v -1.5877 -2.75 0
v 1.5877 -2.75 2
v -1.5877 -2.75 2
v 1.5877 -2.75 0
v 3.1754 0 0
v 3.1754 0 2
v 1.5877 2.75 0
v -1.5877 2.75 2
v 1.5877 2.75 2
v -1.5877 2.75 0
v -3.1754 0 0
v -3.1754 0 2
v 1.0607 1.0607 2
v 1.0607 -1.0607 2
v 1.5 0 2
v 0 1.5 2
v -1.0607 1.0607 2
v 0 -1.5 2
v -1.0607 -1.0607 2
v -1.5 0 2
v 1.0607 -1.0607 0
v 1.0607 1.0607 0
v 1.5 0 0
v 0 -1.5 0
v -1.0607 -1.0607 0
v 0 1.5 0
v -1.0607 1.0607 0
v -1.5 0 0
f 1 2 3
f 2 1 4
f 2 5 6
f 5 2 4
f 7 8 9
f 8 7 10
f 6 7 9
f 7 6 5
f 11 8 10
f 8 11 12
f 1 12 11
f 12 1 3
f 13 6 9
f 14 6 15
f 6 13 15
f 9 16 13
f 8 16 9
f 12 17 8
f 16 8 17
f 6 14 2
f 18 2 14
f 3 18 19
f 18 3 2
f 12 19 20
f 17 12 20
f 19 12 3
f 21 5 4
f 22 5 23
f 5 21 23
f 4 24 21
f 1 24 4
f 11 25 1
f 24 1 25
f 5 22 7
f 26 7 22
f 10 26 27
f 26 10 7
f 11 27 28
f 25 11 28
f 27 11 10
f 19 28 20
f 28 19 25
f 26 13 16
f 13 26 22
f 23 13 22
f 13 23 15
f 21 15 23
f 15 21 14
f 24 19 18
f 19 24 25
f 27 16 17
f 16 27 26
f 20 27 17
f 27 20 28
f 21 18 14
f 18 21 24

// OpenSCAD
// Part number: 000001
// Part version: 0001
// Part name: M3 Hex Nut, 2 mm height, size 5.5
// Sourced part, non-printable


Part_000001_0001_Show();

module Part_000001_0001_Show(simplified=true)
{
    if(simplified)
    {
        p_000001_0001_M3_Hex_Nut($fn=8);
    }
    else
    {
        p_000001_0001_M3_Hex_Nut($fn=16);
    }
}

module p_000001_0001_M3_Hex_Nut(turned=false, center=false)
{
    color("grey")
    p_000001_0001_Hex_Nut(  thread_diameter=3,
                            wrench_size=5.5,
                            height=2,
                            turned=turned,
                            center=center,
                            $fn=$fn);
}

module p_000001_0001_Hex_Nut(thread_diameter, wrench_size, height, turned= false, center=false, $fn=$fn)
{
    rot = turned ? 30 : 0;
    t = center ? 0 : height/2;
    translate([0,0,t])
    rotate([0,0,rot])
    difference()
    {
        cylinder(d=2*wrench_size/sqrt(3), h=height, center=true, $fn=6);
        cylinder(d=thread_diameter, h=height+1, center=true, $fn=$fn);
    }
}
